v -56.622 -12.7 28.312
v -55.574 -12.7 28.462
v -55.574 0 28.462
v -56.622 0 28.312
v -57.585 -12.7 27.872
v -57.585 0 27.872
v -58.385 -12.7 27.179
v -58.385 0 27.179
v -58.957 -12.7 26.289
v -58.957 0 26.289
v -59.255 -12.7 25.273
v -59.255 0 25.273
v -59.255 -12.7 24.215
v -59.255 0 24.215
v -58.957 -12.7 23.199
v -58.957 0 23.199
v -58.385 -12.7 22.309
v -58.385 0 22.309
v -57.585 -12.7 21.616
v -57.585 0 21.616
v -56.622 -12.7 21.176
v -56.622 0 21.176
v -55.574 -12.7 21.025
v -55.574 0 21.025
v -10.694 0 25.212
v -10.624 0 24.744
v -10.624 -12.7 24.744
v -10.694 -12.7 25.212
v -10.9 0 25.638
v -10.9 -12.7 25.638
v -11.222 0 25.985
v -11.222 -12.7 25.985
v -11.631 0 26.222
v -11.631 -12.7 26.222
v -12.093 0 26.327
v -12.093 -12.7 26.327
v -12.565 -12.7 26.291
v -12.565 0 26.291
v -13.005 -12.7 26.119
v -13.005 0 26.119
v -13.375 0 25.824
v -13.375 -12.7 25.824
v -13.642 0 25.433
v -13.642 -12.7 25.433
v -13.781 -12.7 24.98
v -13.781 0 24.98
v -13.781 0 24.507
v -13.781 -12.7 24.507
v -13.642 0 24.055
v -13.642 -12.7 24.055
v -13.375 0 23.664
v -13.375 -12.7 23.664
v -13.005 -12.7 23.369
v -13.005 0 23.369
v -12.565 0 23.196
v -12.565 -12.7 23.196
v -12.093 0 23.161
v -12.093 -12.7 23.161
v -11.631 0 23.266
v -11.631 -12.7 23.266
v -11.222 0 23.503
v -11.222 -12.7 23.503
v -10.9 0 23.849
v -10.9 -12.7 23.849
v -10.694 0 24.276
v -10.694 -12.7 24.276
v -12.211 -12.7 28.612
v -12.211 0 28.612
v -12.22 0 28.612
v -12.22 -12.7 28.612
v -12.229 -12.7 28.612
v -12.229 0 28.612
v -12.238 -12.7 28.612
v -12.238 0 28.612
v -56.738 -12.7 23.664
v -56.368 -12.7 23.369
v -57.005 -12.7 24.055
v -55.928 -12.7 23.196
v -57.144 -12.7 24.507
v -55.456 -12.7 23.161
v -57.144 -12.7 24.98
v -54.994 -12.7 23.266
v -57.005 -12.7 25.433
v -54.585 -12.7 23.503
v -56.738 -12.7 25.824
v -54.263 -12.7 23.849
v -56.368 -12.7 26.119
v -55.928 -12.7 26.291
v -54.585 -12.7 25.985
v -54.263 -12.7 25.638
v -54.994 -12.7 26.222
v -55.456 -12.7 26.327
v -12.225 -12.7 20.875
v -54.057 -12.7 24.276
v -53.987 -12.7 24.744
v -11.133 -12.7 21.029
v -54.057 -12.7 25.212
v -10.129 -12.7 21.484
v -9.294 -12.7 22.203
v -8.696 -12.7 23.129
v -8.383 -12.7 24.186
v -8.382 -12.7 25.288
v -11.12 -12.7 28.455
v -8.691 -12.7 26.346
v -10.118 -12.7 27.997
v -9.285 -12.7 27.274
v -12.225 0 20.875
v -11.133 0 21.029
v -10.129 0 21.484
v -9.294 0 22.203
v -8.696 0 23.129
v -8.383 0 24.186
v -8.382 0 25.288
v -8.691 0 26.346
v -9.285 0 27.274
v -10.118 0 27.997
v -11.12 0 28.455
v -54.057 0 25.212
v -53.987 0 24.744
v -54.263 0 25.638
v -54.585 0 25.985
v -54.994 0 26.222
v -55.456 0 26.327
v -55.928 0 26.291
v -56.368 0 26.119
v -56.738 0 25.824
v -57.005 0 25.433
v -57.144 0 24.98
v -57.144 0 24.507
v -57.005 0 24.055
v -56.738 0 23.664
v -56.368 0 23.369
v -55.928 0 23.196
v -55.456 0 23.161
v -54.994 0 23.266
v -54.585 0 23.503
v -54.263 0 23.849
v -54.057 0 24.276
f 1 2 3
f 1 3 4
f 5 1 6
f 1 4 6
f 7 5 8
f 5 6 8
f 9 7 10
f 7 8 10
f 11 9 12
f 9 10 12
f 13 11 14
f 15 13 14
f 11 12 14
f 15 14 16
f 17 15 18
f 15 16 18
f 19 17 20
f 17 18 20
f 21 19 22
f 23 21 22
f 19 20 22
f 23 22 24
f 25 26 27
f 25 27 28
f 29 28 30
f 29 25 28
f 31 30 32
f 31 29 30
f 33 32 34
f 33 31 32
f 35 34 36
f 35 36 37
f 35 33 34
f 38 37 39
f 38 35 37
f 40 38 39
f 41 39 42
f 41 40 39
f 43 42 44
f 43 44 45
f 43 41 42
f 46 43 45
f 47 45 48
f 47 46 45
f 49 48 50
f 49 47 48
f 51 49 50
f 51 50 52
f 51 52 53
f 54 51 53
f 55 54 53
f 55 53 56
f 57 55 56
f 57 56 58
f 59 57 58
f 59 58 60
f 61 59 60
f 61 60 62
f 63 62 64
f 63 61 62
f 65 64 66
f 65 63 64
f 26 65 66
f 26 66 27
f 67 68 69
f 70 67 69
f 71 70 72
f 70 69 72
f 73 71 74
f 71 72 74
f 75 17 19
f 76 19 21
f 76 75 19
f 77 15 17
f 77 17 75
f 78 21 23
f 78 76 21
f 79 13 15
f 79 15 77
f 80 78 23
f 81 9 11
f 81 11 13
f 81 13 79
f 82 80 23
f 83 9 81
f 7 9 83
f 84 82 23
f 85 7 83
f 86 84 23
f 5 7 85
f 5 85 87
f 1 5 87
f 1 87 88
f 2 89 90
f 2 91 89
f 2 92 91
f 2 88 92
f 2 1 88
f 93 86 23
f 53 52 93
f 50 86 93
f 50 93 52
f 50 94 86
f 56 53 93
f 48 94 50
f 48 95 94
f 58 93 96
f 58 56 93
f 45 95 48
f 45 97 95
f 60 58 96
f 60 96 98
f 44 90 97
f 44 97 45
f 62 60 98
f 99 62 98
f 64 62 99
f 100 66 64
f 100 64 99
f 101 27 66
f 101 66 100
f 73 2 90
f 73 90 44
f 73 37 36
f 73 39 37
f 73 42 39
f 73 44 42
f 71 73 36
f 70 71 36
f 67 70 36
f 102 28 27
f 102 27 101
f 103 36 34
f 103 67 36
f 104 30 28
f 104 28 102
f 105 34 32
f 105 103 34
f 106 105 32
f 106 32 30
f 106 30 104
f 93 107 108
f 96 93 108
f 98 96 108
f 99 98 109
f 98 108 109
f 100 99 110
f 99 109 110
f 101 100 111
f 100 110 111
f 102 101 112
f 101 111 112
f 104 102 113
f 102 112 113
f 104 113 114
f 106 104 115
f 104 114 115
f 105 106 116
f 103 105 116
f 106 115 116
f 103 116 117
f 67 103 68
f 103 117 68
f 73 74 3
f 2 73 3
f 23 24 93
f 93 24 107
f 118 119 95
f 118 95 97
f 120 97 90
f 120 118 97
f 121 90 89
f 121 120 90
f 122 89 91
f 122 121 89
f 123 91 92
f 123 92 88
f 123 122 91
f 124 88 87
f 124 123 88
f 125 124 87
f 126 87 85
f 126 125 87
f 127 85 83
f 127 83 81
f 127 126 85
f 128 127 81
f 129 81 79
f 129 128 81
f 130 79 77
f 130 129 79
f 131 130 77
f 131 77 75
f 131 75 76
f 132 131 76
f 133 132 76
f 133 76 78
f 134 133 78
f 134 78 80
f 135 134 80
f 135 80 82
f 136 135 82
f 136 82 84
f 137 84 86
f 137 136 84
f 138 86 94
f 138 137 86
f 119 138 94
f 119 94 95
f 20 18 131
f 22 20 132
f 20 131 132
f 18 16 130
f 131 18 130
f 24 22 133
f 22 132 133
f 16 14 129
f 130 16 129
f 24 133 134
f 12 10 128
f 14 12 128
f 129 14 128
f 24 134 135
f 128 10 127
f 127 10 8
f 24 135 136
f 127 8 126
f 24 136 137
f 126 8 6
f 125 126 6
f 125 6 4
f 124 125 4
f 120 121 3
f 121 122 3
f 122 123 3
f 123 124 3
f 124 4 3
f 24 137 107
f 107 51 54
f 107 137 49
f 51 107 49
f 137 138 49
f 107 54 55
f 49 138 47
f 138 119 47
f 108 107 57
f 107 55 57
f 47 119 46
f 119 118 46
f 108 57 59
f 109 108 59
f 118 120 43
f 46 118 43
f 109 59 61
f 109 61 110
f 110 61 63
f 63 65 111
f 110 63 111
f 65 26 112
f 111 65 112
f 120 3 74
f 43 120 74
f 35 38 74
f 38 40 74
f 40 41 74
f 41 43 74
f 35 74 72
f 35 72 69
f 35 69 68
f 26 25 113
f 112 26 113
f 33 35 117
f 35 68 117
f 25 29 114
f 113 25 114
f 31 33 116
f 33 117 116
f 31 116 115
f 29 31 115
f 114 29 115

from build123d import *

# Parameters (mm, degrees)
F0_R     = 1.5875
F1_DEPTH = 12.7


with BuildPart() as f1:
    # F0 (on Front) → F1 (new body)
    with BuildSketch(Plane.XZ):
        with BuildLine():
            Line((-12.238163, 28.612093), (-55.574305, 28.462326))
            ThreePointArc((-55.574305, 28.462326), (-59.292865, 24.743766), (-55.574305, 21.025206))
            Line((-55.574305, 21.025206), (-12.224796, 20.875369))
            ThreePointArc((-12.224796, 20.875369), (-8.343011, 24.73708), (-12.211425, 28.612186))
            ThreePointArc((-12.211425, 28.612186), (-12.224794, 28.612162), (-12.238163, 28.612093))
        make_face()
        with Locations((-55.574305, 24.743766)):
            Circle(F0_R, mode=Mode.SUBTRACT)
        with Locations((-12.211425, 24.743766)):
            Circle(F0_R, mode=Mode.SUBTRACT)
    extrude(amount=F1_DEPTH)


solid = f1.part
